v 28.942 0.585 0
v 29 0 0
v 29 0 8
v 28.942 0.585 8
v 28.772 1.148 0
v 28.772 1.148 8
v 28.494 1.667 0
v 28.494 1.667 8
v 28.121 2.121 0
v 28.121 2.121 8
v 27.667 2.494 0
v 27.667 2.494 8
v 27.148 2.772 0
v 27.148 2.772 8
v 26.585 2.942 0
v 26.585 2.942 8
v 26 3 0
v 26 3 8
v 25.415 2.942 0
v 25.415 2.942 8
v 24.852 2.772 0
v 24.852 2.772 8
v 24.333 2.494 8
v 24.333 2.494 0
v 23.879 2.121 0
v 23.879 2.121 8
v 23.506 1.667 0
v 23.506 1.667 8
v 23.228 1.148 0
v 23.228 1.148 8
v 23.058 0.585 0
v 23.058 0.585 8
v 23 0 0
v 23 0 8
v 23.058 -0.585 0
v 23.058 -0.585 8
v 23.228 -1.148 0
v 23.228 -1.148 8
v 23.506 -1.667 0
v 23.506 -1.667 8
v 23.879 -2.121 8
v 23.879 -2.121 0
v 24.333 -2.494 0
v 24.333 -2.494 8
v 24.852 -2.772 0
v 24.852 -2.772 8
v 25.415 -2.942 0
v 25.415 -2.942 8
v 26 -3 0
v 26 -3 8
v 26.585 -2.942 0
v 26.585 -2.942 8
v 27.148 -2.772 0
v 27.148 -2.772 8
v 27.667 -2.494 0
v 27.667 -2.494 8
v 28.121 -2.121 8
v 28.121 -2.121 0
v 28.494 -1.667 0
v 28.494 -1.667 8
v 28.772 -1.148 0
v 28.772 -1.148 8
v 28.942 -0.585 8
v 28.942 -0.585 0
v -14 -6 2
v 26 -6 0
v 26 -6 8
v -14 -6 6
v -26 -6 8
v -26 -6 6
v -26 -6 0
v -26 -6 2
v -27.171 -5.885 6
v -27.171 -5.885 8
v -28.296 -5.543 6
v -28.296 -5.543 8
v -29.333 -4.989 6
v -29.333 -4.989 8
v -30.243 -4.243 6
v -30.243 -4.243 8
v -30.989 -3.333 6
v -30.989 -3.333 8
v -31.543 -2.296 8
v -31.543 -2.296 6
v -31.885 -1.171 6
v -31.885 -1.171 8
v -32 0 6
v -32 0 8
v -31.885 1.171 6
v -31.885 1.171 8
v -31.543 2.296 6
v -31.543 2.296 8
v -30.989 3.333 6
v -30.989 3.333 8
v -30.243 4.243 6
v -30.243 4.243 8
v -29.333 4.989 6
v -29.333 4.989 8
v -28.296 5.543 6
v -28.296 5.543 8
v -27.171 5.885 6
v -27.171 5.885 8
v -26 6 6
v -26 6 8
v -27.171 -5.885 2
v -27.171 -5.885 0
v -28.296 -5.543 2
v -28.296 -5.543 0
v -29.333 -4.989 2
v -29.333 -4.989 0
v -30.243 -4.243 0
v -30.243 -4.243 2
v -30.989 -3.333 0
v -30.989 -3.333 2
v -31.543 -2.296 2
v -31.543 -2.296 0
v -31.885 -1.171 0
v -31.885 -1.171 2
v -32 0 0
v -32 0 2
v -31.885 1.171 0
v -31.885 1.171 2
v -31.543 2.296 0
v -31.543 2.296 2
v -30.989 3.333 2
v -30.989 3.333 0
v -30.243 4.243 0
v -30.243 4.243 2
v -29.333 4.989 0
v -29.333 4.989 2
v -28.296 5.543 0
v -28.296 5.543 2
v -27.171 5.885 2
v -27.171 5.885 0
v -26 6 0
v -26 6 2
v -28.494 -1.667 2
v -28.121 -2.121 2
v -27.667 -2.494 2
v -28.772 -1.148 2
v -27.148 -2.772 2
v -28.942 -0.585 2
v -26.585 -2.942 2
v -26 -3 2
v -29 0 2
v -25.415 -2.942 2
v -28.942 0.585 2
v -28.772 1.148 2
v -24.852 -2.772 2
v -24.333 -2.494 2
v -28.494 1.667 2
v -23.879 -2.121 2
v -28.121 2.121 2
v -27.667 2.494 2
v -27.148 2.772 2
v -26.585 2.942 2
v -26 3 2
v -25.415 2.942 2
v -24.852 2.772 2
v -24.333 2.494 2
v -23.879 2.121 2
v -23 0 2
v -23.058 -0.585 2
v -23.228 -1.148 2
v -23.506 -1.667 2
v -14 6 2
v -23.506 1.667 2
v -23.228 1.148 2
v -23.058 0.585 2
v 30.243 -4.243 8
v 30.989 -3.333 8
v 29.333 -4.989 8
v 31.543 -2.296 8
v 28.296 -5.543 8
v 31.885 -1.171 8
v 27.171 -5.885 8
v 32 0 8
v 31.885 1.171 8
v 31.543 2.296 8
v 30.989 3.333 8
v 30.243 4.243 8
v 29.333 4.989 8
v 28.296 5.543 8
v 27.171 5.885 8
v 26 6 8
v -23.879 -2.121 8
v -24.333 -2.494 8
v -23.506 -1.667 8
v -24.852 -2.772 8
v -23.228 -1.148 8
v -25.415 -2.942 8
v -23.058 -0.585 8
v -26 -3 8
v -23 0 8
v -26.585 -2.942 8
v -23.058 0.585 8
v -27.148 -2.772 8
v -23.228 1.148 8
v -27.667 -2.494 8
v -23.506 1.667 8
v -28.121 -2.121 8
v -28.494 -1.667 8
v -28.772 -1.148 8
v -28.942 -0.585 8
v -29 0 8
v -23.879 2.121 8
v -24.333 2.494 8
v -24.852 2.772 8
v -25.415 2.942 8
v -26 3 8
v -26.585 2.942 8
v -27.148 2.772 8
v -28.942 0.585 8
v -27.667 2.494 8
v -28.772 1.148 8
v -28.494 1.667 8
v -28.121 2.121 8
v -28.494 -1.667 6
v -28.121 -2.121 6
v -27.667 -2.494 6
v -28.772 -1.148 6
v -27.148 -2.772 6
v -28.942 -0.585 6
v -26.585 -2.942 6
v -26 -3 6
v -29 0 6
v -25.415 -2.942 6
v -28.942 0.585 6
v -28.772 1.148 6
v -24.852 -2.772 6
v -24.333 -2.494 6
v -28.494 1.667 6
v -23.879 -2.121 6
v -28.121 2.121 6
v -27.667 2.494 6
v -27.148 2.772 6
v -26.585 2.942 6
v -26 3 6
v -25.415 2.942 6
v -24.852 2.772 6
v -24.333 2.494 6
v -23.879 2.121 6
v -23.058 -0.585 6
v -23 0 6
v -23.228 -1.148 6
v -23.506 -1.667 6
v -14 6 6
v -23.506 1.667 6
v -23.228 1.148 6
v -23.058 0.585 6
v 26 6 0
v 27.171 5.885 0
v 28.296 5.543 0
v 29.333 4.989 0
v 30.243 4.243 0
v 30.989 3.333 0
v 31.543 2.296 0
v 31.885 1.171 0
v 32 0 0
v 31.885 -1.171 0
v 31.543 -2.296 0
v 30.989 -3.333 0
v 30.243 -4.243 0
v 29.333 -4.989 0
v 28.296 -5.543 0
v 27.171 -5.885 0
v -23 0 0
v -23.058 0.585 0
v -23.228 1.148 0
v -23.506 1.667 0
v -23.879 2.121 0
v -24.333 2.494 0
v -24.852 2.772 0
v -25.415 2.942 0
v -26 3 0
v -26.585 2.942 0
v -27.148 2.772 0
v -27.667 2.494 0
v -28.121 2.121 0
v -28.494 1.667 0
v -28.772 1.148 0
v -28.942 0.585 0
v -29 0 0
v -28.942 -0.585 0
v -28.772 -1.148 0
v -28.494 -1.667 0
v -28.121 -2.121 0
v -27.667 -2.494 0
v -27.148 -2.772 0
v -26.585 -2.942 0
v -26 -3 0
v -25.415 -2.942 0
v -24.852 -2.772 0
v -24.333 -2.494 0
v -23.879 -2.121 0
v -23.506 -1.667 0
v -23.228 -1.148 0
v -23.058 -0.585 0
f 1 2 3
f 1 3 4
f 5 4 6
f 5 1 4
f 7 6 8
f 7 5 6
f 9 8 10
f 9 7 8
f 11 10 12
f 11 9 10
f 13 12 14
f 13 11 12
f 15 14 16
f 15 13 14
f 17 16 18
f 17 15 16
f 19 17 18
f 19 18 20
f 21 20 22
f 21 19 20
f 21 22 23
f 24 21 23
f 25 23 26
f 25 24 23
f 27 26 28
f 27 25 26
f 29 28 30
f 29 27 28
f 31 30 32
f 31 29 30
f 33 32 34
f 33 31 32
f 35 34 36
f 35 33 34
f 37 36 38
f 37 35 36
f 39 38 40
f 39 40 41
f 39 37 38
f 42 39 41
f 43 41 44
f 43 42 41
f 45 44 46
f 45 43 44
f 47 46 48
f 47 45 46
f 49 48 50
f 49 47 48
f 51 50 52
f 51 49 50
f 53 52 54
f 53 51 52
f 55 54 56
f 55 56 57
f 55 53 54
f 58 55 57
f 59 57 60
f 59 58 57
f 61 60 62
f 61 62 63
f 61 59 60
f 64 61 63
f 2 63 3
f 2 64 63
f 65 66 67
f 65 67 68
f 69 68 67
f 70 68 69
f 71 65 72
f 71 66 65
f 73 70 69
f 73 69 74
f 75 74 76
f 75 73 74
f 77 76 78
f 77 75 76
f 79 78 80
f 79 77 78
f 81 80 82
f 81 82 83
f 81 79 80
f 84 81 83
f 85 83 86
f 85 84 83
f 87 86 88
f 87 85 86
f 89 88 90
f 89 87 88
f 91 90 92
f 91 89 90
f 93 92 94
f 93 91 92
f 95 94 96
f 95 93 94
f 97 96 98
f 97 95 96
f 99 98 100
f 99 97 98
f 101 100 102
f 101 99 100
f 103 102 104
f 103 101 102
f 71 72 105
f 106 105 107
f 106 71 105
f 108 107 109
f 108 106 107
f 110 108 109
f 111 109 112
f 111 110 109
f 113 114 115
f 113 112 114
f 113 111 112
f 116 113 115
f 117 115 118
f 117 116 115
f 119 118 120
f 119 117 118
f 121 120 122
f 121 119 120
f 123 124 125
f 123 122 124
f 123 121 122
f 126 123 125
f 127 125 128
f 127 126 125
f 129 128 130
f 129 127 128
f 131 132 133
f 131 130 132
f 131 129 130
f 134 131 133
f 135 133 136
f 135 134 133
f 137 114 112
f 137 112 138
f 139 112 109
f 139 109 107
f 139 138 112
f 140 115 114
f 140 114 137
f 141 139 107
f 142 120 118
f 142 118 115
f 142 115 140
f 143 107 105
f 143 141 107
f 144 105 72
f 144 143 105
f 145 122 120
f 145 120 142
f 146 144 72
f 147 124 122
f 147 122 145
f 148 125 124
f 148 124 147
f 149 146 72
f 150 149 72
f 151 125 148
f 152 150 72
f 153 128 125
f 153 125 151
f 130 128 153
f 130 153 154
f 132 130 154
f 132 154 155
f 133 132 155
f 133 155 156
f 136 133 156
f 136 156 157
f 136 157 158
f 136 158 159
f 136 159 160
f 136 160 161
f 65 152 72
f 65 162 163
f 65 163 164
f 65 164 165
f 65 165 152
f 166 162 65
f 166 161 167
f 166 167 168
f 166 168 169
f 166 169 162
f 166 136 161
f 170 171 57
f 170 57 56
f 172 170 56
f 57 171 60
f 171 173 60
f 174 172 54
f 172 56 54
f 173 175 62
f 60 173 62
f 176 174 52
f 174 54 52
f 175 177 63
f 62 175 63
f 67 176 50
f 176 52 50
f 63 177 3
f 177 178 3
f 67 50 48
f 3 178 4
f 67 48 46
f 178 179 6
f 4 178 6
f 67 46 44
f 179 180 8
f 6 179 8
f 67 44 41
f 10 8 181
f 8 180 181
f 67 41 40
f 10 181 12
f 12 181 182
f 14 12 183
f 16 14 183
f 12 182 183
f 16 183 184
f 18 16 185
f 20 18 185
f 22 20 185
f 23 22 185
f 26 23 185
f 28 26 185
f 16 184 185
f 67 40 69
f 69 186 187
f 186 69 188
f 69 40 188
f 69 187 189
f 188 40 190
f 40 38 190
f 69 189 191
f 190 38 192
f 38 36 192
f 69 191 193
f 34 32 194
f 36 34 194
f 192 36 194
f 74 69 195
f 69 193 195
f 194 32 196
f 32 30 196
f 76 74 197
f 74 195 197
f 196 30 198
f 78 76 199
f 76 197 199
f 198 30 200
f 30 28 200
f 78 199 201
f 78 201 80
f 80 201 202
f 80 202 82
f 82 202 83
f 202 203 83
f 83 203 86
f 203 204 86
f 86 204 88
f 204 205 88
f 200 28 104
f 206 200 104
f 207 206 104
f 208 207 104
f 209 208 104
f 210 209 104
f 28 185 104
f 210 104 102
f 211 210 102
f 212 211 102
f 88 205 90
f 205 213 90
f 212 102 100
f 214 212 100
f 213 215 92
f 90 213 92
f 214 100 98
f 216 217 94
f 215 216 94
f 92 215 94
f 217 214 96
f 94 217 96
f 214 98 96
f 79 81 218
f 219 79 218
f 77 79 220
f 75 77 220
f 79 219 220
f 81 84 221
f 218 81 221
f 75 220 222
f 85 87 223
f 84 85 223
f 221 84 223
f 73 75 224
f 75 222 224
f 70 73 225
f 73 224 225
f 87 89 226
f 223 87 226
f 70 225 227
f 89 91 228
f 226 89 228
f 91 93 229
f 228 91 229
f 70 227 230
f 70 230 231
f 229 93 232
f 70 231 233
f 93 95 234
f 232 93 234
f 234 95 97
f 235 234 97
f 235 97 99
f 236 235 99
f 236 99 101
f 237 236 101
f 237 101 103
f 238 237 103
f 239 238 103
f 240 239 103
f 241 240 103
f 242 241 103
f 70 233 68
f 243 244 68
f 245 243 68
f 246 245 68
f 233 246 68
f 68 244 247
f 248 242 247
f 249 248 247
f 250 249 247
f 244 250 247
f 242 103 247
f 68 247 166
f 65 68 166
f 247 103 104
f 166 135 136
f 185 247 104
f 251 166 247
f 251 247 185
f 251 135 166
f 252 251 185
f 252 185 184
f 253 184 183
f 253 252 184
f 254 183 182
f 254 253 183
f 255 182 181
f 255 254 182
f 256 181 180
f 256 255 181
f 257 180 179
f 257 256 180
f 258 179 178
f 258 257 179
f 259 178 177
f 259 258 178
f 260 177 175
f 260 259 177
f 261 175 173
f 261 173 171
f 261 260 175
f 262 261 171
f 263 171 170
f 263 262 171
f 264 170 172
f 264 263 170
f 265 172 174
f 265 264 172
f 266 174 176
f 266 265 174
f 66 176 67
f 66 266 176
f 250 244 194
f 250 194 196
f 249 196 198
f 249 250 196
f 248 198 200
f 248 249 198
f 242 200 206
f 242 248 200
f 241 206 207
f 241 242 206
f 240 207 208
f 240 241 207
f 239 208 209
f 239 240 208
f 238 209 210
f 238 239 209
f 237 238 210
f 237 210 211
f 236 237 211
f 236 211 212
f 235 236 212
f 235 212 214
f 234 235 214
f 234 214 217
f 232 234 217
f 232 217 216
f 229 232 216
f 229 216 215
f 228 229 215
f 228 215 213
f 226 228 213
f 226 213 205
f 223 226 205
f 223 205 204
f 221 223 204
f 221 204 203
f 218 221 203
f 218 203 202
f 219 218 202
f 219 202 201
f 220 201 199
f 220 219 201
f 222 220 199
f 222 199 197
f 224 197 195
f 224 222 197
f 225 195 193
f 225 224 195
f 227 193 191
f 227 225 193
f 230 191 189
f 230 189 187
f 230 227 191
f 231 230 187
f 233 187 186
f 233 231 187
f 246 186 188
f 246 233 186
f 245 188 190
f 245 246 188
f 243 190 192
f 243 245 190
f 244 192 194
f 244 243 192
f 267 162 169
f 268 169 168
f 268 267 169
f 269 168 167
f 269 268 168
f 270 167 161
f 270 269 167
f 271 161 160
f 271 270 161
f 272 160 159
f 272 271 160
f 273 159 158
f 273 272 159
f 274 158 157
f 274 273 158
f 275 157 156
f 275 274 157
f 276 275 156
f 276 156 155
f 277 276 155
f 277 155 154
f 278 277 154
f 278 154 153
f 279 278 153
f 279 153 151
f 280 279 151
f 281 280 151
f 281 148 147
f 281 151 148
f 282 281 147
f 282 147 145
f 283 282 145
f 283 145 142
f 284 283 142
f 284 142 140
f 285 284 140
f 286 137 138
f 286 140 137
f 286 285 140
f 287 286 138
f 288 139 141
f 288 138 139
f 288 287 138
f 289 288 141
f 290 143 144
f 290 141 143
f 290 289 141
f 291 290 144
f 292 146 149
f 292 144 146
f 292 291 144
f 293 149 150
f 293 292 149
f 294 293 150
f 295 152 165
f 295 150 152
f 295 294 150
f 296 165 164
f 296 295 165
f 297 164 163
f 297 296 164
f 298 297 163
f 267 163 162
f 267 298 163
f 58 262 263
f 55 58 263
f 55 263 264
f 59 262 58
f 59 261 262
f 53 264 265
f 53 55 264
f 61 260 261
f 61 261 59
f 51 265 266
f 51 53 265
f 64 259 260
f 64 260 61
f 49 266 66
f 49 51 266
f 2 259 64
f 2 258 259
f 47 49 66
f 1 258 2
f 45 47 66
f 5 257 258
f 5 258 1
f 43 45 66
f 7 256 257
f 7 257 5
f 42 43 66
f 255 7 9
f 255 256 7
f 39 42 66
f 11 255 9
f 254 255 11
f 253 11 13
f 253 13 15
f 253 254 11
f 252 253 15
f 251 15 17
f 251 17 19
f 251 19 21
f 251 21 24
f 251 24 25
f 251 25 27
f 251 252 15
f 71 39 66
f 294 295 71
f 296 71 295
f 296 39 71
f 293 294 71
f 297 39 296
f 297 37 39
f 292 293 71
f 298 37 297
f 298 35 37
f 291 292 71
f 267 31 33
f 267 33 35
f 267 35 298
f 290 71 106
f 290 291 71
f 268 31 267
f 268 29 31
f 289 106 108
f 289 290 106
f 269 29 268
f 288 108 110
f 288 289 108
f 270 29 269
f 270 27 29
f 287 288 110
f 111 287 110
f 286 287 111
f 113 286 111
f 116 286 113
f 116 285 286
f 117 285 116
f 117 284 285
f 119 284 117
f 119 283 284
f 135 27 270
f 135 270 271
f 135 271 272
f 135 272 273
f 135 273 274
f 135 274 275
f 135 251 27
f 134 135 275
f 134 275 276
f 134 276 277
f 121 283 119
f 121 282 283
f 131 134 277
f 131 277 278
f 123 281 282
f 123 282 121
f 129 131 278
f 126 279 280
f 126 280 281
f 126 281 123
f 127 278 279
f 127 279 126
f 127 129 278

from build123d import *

# Parameters (mm, degrees)
SKETCH_1_R          = 3
EXTRUDE_1_DEPTH     = 8
SKETCH_2_W          = 18
SKETCH_2_H          = 4
CUT_EXTRUDE_1_DEPTH = 36.09985755


with BuildPart() as part:
    # 草图1 → 凸台-拉伸1 (new body)
    with BuildSketch(Plane.XY):
        with BuildLine():
            Line((-26, 6), (26, 6))
            ThreePointArc((26, 6), (32, 0), (26, -6))
            Line((26, -6), (-26, -6))
            ThreePointArc((-26, -6), (-32, 0), (-26, 6))
        make_face()
        with Locations((-26, 0)):
            Circle(SKETCH_1_R, mode=Mode.SUBTRACT)
        with Locations((26, 0)):
            Circle(SKETCH_1_R, mode=Mode.SUBTRACT)
    extrude(amount=EXTRUDE_1_DEPTH)

    # 草图2 → 切除-拉伸1 (cut, through all)
    with BuildSketch(Plane(origin=(0, 6, 0), x_dir=(1, 0, 0), z_dir=(0, 1, 0))):
        with Locations((-23, -4)):
            Rectangle(SKETCH_2_W, SKETCH_2_H)
    extrude(amount=-CUT_EXTRUDE_1_DEPTH, mode=Mode.SUBTRACT)


solid = part.part
